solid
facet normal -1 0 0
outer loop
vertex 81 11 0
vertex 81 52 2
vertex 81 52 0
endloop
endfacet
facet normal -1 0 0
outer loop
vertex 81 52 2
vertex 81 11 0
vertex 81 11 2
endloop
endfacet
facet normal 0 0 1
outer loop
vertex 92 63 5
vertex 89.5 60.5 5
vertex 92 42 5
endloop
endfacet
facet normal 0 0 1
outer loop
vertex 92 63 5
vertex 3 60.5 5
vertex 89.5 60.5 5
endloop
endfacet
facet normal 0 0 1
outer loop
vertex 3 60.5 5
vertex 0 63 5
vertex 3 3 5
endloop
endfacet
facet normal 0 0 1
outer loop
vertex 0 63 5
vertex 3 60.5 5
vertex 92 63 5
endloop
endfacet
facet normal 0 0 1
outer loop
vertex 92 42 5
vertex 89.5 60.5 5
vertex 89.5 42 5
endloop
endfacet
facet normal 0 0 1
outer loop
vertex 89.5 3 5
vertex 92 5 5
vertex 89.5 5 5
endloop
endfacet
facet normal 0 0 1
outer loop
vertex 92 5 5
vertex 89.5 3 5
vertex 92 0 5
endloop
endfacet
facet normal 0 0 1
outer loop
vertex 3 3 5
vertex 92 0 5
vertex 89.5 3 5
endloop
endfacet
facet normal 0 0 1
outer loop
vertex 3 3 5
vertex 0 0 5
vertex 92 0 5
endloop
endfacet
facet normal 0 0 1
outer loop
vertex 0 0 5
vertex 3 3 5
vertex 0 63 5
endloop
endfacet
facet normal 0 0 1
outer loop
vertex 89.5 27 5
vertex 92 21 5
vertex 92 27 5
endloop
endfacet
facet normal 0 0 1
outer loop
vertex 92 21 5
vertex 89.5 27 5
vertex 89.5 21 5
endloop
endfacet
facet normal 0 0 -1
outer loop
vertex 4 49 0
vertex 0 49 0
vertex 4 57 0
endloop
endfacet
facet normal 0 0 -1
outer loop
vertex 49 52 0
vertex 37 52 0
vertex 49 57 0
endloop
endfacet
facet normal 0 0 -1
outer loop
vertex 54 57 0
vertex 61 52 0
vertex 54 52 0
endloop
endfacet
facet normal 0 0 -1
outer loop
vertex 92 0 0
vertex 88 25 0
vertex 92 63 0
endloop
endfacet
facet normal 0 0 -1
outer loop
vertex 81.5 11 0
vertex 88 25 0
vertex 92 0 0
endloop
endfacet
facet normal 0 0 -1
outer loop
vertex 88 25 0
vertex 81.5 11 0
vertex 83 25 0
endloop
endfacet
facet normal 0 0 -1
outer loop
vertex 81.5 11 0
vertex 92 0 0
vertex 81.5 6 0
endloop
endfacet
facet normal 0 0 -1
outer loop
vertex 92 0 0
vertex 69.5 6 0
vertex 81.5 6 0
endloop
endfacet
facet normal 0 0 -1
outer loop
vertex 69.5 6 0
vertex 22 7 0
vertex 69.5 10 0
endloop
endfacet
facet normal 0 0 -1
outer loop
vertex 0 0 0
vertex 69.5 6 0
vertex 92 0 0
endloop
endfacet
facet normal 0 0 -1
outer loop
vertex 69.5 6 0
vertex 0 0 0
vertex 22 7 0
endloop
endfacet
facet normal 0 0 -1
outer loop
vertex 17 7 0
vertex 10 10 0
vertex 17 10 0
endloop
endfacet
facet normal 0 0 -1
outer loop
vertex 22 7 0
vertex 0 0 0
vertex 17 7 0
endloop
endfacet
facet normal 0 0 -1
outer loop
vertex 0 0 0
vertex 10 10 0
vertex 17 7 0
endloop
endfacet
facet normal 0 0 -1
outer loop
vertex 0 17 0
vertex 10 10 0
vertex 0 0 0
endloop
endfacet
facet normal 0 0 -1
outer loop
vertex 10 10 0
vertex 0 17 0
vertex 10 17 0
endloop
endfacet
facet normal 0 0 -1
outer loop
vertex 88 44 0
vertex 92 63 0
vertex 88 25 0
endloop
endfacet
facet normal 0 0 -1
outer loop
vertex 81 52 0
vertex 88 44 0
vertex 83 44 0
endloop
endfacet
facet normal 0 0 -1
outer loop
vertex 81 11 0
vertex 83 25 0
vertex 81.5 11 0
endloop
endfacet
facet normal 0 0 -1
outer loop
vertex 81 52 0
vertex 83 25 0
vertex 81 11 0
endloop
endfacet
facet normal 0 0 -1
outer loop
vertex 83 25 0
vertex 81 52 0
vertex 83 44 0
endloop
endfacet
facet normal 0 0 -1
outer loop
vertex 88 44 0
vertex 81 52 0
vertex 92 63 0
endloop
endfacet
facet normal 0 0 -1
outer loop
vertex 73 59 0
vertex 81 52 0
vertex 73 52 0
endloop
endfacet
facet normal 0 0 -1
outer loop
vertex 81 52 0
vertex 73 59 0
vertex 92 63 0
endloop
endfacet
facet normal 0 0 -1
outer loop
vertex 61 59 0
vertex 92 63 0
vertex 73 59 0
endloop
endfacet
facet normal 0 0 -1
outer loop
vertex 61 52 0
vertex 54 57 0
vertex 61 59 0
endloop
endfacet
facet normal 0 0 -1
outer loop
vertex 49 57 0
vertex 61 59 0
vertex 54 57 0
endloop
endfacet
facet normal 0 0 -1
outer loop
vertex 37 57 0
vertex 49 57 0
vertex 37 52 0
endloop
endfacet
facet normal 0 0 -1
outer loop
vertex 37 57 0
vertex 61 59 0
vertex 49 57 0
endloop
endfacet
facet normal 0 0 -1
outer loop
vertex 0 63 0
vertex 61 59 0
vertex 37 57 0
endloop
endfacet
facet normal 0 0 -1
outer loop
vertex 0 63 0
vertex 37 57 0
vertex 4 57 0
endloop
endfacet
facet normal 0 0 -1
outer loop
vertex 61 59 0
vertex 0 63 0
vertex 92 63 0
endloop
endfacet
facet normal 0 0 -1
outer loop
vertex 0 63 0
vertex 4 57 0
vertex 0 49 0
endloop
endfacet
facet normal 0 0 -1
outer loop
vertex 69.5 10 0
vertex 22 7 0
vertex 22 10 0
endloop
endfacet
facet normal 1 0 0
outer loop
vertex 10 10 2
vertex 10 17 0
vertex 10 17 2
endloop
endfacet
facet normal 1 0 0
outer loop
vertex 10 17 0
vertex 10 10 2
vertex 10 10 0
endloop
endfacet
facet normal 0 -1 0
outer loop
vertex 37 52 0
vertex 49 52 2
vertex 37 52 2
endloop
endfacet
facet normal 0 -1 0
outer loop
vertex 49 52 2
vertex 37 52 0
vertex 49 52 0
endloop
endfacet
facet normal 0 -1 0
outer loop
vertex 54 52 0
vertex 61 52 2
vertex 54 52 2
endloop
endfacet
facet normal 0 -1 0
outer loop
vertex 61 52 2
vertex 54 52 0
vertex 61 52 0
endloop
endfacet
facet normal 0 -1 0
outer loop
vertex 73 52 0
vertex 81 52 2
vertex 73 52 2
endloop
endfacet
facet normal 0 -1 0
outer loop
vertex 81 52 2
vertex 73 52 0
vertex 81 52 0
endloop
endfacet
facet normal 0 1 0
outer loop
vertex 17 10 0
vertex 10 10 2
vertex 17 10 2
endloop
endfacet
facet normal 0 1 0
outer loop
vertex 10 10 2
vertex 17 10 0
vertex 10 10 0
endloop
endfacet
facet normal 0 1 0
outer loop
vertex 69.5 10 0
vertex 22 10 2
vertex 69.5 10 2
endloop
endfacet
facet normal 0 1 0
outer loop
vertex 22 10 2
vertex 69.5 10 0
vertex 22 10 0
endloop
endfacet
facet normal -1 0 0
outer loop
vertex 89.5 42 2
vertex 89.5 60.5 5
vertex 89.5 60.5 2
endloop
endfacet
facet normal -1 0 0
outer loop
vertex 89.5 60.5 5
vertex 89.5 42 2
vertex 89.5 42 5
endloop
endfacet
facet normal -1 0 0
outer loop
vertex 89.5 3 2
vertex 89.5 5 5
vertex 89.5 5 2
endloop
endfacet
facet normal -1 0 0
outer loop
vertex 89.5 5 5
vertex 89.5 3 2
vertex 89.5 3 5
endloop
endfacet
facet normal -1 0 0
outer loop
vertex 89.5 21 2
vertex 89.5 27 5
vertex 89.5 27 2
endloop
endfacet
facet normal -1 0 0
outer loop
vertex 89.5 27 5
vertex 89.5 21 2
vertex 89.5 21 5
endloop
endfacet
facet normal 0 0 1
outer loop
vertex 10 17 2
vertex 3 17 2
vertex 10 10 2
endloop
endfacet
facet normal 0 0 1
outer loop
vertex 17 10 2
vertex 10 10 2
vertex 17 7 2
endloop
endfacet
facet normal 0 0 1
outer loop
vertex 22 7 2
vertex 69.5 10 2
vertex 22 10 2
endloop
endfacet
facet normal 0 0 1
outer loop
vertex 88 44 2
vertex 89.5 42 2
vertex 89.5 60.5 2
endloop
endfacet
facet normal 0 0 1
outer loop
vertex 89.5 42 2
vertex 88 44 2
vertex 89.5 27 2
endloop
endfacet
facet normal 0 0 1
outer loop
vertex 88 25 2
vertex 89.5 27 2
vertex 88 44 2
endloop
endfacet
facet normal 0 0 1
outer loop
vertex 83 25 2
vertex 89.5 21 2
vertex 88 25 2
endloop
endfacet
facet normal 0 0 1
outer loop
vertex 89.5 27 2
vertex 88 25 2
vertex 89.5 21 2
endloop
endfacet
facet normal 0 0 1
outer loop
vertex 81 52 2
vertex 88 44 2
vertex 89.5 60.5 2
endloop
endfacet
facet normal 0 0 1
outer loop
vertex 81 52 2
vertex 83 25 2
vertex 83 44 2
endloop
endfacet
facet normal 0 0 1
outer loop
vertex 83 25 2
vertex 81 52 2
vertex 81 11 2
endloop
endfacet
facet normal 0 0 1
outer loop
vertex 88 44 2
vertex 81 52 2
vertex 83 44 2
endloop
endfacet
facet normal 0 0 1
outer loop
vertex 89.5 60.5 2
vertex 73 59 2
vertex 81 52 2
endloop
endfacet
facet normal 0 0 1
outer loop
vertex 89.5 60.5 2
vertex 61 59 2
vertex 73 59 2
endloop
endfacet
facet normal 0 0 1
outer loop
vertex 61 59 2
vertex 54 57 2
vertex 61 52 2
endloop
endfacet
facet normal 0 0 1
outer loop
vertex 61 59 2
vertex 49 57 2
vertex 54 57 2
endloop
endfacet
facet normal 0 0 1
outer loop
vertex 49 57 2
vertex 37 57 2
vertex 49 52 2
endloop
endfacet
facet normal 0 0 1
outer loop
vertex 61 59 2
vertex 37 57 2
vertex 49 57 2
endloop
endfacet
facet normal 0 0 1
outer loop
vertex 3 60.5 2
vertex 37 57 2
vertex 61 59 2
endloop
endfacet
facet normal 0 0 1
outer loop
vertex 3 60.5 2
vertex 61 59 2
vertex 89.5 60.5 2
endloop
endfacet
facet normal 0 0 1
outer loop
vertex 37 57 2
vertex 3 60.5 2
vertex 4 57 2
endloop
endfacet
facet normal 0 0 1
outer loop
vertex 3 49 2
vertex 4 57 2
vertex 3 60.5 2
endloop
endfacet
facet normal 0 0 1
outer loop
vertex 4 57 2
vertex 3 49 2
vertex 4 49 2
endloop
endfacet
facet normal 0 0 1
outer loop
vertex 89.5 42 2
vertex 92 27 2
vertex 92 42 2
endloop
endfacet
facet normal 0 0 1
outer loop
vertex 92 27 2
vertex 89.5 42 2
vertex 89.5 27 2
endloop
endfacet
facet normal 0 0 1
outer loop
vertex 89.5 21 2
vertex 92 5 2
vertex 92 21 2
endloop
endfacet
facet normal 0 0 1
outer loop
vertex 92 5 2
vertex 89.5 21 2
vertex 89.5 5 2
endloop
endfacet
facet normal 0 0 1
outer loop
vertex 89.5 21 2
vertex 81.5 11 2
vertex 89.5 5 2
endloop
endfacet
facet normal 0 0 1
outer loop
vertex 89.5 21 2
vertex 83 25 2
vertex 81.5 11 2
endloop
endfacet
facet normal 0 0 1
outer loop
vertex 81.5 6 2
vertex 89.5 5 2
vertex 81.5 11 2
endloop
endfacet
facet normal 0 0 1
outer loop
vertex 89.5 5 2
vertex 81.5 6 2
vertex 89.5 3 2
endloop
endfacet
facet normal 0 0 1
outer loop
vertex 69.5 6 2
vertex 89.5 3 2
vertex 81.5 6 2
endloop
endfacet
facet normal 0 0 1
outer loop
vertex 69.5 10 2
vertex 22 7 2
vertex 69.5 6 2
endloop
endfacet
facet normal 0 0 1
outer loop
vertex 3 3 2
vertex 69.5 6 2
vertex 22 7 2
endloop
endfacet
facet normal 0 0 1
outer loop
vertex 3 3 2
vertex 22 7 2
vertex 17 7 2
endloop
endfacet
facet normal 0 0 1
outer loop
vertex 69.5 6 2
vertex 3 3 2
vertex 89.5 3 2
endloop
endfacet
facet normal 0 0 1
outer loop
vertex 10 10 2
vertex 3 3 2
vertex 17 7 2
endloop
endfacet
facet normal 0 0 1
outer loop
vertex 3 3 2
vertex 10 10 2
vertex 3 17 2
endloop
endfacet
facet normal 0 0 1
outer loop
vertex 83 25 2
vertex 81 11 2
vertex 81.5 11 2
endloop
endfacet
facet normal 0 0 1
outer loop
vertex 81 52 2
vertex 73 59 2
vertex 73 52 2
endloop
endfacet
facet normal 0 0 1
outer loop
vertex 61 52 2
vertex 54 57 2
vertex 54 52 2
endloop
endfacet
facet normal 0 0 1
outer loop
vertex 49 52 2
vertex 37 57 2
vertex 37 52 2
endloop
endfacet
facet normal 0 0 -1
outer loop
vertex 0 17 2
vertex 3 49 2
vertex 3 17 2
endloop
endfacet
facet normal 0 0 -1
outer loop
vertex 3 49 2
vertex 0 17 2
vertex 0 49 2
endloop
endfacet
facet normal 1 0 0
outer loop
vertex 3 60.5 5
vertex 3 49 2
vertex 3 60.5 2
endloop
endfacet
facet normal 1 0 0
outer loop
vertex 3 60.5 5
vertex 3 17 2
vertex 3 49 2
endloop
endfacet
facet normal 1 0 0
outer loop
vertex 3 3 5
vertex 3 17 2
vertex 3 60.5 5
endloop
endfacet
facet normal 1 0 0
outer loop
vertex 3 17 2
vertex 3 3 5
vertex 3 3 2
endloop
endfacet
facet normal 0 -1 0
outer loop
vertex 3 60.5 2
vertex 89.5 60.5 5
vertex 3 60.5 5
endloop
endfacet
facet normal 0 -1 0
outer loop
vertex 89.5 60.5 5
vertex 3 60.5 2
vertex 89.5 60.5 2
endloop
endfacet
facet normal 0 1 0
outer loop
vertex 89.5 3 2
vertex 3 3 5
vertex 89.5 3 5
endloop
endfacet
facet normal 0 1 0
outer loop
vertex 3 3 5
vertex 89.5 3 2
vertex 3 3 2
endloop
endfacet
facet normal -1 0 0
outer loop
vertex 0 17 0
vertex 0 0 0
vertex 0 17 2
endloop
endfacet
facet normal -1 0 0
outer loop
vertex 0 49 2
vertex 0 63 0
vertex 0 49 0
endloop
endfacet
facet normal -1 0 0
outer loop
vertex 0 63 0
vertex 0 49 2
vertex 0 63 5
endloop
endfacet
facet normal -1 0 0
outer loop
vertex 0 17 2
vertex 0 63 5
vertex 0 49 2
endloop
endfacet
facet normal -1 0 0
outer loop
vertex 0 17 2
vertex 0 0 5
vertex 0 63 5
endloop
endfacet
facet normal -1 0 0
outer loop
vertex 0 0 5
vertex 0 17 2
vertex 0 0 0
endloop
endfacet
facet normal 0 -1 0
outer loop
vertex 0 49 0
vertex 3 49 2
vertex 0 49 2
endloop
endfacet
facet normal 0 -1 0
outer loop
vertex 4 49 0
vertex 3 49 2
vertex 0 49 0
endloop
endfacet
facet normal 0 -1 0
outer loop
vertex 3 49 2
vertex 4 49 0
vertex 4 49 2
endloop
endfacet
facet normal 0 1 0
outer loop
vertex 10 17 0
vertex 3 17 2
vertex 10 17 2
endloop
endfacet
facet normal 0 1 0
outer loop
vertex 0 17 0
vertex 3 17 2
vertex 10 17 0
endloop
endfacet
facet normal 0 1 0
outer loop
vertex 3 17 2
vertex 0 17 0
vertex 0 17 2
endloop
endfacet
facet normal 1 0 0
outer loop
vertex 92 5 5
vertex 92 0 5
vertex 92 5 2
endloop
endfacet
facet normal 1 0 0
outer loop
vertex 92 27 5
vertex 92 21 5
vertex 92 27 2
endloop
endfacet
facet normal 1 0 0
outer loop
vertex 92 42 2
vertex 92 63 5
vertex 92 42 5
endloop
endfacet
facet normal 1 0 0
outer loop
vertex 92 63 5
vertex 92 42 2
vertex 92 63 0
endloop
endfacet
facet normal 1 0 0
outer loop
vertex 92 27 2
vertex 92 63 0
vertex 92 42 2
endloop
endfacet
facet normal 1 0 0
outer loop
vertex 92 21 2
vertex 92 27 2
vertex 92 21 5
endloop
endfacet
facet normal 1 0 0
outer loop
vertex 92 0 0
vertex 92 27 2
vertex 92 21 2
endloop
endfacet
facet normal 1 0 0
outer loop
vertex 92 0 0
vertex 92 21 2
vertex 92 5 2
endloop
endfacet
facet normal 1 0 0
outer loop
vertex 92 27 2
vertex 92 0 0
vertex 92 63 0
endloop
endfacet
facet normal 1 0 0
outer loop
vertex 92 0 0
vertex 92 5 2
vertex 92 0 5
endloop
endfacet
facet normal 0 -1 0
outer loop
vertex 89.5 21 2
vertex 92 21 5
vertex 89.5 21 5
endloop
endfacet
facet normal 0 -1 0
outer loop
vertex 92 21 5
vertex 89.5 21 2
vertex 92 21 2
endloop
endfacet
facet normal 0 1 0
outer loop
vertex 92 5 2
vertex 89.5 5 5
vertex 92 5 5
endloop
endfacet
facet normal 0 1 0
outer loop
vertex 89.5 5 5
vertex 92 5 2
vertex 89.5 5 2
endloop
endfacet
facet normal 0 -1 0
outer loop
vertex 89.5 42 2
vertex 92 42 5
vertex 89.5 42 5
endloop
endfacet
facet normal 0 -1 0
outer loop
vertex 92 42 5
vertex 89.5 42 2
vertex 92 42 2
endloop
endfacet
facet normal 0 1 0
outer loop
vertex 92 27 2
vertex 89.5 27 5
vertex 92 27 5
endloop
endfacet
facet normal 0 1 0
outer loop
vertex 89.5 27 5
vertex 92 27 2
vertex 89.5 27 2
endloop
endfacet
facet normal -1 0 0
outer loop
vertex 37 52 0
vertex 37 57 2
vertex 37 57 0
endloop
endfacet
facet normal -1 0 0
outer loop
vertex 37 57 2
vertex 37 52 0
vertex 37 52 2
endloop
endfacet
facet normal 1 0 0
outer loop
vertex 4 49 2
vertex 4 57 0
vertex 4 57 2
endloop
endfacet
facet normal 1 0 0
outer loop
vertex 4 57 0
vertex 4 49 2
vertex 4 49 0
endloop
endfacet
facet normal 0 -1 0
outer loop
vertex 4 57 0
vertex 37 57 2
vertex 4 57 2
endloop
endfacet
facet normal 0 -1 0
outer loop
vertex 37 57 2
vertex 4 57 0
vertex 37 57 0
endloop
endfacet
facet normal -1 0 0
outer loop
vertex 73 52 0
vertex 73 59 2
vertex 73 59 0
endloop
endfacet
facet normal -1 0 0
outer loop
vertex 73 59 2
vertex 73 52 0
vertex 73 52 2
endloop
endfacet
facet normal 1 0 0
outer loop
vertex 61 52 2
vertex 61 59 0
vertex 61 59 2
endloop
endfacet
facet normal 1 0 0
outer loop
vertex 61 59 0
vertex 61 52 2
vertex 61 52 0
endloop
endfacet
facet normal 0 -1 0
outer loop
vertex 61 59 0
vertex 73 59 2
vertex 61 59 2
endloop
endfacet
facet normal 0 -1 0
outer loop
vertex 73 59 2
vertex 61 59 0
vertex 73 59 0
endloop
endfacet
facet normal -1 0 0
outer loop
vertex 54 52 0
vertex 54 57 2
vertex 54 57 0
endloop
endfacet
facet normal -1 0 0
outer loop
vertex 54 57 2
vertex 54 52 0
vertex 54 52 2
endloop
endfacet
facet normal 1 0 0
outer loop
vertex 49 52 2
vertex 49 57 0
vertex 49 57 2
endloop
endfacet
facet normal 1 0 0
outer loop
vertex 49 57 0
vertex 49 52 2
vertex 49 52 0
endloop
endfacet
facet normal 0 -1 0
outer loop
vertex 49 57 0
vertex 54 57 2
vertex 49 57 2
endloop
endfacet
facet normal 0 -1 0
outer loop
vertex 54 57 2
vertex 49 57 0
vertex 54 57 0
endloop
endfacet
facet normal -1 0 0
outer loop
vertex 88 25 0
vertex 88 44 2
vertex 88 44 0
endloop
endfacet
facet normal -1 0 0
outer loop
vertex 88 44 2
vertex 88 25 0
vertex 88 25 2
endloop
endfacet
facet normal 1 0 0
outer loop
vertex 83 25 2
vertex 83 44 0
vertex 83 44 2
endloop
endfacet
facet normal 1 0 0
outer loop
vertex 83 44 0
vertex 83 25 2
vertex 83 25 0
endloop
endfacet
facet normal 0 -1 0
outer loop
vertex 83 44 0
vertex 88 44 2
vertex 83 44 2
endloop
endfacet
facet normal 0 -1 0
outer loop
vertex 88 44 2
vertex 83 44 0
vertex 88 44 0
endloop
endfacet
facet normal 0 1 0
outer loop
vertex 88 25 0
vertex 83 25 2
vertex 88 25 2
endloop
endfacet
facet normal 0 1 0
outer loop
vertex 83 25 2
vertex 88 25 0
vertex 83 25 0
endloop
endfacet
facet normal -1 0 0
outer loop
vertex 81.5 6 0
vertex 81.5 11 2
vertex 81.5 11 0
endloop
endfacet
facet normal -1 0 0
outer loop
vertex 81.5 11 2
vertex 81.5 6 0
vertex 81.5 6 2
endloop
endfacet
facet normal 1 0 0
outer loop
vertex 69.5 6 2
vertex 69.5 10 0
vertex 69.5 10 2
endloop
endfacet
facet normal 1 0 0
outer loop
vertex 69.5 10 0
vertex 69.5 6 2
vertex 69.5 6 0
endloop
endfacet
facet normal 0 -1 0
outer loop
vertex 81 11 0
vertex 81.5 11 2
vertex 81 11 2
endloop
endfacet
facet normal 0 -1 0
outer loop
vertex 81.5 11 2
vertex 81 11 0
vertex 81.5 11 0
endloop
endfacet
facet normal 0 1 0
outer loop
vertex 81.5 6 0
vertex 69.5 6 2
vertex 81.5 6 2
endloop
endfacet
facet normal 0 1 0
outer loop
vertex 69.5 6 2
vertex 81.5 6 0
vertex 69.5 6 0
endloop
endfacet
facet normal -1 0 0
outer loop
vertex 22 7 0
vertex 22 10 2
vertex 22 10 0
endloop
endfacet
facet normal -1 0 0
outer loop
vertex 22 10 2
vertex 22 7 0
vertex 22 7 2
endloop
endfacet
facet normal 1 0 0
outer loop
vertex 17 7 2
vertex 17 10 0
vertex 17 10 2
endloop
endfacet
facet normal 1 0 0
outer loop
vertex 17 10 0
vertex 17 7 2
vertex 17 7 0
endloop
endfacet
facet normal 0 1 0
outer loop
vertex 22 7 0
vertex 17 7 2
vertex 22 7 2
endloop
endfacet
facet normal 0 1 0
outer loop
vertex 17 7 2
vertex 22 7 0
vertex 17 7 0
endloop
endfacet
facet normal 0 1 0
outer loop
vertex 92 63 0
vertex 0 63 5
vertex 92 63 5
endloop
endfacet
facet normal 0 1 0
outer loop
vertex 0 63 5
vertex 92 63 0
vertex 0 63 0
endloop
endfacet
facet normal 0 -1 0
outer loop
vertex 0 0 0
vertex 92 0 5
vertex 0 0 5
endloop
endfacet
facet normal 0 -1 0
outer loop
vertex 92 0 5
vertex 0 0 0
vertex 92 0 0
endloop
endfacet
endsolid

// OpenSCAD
// Globals

difference()
{
	union()
	{
		cube([92,63,5]);
	}

	union()
	{
		translate ([10,10,0]) cube ([71,42,5]);
		translate ([3,3,2]) cube ([86.5,57.5,3]);
		translate ([0,17,0]) cube ([10,32,2]); // SD Card
		translate ([89,5,2]) cube ([3,16,3]); // Ethernet Port
		translate ([89,27,2]) cube ([3,15,3]); // USB Ports
		translate ([4,49,0]) cube ([33,8,2]); // Soldered Pins
		translate ([61,52,0]) cube ([12,7,2]); // Soldered Pins
		translate ([49,52,0]) cube ([5,5,2]); // Soldered Pins
		translate ([83,25,0]) cube ([5,19,2]); // Soldered Pins
		translate ([69.5,6,0]) cube ([12,5,2]); // Soldered Pins
		translate ([17,7,0]) cube ([5,5,2]); // Soldered Pins
	}
}
